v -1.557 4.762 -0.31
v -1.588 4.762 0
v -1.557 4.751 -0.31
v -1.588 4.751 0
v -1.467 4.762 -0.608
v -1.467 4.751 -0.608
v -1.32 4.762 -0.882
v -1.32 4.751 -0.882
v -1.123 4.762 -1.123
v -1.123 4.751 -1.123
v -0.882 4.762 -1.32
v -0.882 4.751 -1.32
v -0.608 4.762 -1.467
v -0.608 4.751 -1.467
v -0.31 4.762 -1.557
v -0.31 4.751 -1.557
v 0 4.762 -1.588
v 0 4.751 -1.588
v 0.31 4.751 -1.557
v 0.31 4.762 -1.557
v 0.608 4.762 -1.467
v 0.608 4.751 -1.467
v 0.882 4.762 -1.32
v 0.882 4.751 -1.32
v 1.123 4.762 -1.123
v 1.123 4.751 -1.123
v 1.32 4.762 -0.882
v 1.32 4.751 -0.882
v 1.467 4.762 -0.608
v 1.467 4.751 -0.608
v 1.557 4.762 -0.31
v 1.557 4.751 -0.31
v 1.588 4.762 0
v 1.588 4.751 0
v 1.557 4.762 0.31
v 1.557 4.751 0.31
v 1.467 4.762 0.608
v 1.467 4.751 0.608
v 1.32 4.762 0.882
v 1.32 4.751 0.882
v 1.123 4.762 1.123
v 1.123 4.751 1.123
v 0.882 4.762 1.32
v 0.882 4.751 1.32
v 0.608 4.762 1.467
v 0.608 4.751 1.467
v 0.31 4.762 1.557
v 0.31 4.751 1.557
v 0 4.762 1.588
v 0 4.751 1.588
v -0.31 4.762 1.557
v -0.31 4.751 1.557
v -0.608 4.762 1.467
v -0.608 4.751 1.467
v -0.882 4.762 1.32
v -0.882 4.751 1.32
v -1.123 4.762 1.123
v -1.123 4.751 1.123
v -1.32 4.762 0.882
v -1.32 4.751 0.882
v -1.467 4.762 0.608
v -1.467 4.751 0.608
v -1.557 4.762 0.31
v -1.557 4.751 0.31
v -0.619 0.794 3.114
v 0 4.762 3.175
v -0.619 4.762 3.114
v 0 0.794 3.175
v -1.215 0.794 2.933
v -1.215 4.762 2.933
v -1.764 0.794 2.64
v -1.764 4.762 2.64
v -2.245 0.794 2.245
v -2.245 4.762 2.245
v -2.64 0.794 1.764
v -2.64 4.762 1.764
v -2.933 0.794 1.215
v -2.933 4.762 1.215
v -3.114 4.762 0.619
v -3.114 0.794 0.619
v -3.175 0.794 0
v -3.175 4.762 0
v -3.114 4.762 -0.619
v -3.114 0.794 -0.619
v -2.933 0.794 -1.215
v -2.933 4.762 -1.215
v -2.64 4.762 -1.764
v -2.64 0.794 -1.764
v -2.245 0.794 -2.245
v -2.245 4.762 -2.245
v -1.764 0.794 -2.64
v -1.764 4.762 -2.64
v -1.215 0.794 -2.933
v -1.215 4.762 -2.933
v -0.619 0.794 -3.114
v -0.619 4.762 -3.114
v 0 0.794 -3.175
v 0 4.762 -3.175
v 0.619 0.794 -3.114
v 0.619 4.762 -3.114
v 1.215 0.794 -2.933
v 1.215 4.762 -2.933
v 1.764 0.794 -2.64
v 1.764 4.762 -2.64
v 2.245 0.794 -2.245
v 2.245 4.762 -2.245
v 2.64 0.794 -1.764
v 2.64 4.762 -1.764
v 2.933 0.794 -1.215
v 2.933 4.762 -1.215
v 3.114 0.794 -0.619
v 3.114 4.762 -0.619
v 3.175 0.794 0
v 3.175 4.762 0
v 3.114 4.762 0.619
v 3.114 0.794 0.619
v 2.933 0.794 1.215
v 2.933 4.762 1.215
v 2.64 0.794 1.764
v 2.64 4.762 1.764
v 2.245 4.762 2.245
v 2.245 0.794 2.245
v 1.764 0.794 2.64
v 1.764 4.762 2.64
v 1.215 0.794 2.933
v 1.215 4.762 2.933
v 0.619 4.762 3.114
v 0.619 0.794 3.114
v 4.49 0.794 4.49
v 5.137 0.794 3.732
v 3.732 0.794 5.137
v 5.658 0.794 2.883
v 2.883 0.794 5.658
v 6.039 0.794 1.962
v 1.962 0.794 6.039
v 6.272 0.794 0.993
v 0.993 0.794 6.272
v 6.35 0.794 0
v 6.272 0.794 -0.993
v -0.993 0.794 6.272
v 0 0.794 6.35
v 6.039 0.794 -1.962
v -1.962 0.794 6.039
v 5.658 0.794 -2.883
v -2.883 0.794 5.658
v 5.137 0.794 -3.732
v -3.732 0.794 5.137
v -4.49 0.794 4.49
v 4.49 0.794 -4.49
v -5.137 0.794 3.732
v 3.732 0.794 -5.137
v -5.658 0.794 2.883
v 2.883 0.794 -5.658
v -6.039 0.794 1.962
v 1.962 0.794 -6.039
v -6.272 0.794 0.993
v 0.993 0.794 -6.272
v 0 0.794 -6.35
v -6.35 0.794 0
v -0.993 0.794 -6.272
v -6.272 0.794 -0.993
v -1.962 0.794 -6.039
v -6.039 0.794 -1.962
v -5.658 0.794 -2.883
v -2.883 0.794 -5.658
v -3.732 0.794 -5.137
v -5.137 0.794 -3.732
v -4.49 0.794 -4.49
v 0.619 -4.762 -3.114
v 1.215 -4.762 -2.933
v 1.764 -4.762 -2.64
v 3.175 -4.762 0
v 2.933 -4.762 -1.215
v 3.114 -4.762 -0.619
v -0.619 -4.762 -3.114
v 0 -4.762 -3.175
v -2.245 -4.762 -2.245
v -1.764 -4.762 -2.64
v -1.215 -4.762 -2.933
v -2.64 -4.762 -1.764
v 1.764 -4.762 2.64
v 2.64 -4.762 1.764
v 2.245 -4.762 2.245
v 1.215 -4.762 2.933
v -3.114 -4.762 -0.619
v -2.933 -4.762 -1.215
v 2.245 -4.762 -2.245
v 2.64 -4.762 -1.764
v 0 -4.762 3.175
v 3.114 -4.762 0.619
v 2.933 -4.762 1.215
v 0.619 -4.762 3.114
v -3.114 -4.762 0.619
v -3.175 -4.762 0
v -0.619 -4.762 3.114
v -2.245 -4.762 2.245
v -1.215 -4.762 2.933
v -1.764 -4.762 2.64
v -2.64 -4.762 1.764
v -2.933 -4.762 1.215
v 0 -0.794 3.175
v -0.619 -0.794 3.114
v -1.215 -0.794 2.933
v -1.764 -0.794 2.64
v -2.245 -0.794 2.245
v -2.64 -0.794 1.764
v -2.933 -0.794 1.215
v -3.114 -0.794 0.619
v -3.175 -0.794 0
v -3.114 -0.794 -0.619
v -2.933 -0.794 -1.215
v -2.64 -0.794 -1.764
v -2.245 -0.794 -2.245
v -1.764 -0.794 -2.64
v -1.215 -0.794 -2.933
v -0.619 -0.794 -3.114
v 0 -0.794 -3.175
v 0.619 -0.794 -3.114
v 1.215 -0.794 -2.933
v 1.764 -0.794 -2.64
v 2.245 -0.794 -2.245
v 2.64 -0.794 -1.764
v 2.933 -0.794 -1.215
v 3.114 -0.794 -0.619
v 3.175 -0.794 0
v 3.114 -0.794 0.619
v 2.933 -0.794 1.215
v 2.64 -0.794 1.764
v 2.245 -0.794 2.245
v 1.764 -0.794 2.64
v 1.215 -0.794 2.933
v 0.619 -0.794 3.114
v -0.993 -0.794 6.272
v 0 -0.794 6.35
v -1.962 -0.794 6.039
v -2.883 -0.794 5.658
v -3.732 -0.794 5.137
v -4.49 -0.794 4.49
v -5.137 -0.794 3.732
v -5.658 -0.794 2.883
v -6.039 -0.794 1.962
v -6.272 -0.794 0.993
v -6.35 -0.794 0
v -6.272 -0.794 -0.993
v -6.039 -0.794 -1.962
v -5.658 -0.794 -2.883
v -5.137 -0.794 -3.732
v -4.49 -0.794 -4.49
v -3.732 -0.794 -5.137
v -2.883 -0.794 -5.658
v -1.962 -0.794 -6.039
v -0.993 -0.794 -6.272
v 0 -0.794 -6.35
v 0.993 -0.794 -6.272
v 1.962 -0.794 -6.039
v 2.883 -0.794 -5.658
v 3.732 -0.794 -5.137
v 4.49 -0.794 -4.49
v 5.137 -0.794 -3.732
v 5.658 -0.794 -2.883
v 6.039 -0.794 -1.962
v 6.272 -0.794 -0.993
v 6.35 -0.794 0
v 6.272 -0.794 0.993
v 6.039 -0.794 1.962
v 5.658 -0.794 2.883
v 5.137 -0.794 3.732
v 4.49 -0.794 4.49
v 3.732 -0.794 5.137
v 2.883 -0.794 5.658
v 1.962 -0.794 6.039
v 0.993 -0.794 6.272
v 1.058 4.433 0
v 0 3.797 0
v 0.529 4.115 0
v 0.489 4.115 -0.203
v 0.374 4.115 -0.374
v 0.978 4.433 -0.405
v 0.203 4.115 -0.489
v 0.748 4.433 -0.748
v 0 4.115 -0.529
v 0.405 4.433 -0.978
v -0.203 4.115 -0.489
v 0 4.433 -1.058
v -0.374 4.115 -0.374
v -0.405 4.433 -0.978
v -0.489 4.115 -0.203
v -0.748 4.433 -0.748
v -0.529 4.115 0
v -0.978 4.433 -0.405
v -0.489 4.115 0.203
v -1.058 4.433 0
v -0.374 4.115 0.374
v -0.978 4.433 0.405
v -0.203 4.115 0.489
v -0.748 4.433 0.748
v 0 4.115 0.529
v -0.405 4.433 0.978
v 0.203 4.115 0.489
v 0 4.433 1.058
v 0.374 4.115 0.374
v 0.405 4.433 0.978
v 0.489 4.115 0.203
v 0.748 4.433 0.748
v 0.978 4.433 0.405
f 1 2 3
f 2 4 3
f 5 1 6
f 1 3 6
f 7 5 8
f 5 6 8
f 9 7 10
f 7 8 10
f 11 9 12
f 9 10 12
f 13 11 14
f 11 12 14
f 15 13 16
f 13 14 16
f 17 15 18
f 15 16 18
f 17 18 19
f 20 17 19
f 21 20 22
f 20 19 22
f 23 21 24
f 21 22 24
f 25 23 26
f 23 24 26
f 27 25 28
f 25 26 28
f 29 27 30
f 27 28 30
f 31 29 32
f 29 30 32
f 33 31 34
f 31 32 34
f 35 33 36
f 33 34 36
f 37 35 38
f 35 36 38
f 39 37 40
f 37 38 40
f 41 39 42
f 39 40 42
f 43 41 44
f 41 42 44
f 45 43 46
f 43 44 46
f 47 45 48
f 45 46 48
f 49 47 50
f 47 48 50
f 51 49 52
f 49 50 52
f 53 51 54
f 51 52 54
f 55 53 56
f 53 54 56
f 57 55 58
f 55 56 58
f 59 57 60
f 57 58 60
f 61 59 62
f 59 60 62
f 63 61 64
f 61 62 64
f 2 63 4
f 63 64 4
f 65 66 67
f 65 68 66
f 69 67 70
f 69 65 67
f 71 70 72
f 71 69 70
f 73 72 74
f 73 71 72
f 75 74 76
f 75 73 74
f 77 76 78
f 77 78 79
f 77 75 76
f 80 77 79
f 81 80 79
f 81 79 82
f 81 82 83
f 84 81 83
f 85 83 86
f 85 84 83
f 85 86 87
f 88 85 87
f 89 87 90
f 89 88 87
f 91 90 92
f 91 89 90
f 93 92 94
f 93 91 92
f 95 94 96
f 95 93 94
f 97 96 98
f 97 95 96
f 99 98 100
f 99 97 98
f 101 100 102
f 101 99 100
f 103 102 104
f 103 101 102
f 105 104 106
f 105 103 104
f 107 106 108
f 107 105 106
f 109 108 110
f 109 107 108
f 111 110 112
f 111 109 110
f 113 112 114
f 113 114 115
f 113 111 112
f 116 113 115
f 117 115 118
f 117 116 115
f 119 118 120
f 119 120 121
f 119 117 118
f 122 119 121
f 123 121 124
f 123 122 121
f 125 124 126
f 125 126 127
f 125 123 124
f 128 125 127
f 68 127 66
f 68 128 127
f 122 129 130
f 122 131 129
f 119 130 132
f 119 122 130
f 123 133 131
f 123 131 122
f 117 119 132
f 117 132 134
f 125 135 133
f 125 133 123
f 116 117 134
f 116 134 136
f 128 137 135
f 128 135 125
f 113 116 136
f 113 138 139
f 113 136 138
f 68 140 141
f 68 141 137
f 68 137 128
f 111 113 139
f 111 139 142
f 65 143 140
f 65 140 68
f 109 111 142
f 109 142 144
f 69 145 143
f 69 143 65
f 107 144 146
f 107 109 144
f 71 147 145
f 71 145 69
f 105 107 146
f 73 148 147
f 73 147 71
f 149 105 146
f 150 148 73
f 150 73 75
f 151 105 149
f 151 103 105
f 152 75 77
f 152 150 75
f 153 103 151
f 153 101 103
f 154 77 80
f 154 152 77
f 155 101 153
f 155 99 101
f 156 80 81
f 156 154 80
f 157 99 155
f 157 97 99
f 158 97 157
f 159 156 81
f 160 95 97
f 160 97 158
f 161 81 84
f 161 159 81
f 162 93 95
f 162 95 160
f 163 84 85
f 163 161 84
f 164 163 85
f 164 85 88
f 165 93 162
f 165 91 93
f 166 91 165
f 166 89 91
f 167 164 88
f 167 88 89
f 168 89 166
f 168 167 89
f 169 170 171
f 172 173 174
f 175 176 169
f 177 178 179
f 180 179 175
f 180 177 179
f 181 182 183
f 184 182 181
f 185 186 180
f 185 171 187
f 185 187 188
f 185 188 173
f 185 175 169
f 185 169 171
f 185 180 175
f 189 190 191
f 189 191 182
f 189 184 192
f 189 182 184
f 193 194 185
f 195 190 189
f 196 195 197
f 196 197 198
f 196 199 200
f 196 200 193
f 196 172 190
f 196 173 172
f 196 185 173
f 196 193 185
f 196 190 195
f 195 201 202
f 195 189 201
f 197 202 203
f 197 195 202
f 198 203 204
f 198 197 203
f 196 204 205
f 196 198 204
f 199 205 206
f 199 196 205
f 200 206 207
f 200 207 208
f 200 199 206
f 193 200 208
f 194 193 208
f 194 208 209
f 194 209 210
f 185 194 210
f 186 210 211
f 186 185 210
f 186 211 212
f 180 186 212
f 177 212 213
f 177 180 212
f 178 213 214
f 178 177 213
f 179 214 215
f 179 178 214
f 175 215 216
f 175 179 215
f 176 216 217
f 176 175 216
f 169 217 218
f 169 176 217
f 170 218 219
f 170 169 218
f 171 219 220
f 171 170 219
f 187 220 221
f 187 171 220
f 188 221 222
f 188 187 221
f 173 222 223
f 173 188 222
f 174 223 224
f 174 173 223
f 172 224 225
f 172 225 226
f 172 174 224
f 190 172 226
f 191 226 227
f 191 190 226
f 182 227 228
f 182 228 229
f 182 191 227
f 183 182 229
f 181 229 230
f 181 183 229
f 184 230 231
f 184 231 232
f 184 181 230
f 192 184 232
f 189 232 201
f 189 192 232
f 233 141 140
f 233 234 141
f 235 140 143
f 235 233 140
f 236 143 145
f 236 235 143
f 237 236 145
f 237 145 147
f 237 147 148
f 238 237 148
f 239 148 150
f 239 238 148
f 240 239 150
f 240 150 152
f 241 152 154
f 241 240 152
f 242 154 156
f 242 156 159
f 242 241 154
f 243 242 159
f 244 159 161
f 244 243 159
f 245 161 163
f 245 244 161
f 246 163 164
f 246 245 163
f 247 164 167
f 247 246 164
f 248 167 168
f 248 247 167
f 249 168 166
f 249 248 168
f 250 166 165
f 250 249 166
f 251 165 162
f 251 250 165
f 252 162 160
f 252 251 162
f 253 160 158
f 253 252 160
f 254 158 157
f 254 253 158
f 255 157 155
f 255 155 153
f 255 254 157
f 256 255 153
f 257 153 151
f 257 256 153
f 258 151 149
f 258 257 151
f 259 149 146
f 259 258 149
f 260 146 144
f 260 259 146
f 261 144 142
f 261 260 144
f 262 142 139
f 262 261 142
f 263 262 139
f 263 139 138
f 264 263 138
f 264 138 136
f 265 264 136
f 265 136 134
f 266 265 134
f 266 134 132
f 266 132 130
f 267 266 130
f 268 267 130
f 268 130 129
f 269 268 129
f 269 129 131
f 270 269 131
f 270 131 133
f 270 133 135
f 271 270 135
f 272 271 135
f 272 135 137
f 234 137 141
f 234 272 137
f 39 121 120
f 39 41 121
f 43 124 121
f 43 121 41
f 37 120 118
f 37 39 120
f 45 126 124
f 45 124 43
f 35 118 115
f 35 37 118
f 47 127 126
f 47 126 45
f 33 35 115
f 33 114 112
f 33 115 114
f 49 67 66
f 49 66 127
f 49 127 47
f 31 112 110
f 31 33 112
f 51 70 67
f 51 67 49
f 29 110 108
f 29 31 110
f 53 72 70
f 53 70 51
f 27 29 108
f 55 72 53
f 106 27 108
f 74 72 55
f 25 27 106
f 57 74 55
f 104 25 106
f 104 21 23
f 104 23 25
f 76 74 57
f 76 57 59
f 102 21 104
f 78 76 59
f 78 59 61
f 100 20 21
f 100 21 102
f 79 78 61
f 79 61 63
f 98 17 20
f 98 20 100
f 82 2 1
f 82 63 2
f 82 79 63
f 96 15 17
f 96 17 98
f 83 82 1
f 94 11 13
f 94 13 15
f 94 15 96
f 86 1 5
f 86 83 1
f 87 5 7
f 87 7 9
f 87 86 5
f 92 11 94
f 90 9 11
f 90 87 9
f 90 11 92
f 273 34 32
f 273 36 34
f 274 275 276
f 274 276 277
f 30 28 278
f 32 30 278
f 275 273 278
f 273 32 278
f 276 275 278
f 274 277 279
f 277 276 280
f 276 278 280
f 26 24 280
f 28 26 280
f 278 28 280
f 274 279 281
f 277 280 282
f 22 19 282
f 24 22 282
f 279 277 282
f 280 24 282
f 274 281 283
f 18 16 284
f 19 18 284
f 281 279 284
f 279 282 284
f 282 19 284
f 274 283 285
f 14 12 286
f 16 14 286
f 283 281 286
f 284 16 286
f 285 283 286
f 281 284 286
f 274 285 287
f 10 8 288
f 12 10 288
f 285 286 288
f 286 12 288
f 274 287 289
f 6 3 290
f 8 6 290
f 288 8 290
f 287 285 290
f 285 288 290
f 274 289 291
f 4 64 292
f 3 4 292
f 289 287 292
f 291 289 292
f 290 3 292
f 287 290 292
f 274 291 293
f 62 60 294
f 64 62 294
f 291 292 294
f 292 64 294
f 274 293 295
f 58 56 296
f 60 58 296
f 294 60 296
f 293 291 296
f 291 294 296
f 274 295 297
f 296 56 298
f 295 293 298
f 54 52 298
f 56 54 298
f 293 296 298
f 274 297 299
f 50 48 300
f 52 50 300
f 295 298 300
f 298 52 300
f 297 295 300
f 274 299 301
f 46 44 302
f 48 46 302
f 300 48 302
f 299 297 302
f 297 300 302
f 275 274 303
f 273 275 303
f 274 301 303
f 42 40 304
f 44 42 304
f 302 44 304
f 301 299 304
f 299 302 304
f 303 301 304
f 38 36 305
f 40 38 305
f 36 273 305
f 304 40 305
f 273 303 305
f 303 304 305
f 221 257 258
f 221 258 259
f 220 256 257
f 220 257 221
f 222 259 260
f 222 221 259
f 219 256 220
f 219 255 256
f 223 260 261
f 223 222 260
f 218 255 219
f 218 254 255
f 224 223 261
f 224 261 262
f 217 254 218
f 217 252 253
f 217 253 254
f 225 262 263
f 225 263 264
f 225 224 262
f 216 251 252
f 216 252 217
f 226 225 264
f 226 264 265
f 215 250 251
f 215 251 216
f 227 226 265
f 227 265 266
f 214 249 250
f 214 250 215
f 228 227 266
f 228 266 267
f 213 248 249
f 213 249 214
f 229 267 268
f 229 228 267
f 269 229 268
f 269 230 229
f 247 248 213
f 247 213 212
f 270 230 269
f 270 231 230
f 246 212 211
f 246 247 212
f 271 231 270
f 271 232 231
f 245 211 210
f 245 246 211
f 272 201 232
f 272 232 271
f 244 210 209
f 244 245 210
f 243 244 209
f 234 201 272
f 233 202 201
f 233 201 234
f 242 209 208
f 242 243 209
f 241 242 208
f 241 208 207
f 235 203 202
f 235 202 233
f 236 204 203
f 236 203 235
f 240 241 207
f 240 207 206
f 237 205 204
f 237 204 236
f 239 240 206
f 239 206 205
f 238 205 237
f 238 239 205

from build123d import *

# Parameters (mm, degrees)
F_1_8_0_125_DIAMETER_HOLE1_D     = 3.175
F_1_8_0_125_DIAMETER_HOLE1_DEPTH = 0.011333767
F_1_8_0_125_DIAMETER_HOLE1_TIP   = 0.953866233


with BuildPart() as part:
    # Sketch1 → Revolve1 (revolve)
    with BuildSketch(Plane.XY, mode=Mode.PRIVATE) as revolve1_sk:
        Polygon((0, 4.7625), (3.175, 4.7625), (3.175, 0.79375), (6.35, 0.79375), (6.35, -0.79375), (3.175, -0.79375), (3.175, -4.7625), (0, -4.7625), align=None)
    revolve(revolve1_sk.sketch.rotate(Axis((0, 4.7625, 0), (0, -1, 0)), 90), axis=Axis((0, 4.7625, 0), (0, -1, 0)))

    # 1/8 (0.125) Diameter Hole1
    with Locations(Plane(origin=(0, 4.7625, 0), x_dir=(1, 0, 0), z_dir=(0, 1, 0))):
        with Locations((0, 0)):
            Hole(F_1_8_0_125_DIAMETER_HOLE1_D / 2, depth=F_1_8_0_125_DIAMETER_HOLE1_DEPTH)
            with Locations((0, 0, -(F_1_8_0_125_DIAMETER_HOLE1_DEPTH + F_1_8_0_125_DIAMETER_HOLE1_TIP / 2))):  # 118° drill point
                Cone(0, F_1_8_0_125_DIAMETER_HOLE1_D / 2, F_1_8_0_125_DIAMETER_HOLE1_TIP, mode=Mode.SUBTRACT)


solid = part.part
